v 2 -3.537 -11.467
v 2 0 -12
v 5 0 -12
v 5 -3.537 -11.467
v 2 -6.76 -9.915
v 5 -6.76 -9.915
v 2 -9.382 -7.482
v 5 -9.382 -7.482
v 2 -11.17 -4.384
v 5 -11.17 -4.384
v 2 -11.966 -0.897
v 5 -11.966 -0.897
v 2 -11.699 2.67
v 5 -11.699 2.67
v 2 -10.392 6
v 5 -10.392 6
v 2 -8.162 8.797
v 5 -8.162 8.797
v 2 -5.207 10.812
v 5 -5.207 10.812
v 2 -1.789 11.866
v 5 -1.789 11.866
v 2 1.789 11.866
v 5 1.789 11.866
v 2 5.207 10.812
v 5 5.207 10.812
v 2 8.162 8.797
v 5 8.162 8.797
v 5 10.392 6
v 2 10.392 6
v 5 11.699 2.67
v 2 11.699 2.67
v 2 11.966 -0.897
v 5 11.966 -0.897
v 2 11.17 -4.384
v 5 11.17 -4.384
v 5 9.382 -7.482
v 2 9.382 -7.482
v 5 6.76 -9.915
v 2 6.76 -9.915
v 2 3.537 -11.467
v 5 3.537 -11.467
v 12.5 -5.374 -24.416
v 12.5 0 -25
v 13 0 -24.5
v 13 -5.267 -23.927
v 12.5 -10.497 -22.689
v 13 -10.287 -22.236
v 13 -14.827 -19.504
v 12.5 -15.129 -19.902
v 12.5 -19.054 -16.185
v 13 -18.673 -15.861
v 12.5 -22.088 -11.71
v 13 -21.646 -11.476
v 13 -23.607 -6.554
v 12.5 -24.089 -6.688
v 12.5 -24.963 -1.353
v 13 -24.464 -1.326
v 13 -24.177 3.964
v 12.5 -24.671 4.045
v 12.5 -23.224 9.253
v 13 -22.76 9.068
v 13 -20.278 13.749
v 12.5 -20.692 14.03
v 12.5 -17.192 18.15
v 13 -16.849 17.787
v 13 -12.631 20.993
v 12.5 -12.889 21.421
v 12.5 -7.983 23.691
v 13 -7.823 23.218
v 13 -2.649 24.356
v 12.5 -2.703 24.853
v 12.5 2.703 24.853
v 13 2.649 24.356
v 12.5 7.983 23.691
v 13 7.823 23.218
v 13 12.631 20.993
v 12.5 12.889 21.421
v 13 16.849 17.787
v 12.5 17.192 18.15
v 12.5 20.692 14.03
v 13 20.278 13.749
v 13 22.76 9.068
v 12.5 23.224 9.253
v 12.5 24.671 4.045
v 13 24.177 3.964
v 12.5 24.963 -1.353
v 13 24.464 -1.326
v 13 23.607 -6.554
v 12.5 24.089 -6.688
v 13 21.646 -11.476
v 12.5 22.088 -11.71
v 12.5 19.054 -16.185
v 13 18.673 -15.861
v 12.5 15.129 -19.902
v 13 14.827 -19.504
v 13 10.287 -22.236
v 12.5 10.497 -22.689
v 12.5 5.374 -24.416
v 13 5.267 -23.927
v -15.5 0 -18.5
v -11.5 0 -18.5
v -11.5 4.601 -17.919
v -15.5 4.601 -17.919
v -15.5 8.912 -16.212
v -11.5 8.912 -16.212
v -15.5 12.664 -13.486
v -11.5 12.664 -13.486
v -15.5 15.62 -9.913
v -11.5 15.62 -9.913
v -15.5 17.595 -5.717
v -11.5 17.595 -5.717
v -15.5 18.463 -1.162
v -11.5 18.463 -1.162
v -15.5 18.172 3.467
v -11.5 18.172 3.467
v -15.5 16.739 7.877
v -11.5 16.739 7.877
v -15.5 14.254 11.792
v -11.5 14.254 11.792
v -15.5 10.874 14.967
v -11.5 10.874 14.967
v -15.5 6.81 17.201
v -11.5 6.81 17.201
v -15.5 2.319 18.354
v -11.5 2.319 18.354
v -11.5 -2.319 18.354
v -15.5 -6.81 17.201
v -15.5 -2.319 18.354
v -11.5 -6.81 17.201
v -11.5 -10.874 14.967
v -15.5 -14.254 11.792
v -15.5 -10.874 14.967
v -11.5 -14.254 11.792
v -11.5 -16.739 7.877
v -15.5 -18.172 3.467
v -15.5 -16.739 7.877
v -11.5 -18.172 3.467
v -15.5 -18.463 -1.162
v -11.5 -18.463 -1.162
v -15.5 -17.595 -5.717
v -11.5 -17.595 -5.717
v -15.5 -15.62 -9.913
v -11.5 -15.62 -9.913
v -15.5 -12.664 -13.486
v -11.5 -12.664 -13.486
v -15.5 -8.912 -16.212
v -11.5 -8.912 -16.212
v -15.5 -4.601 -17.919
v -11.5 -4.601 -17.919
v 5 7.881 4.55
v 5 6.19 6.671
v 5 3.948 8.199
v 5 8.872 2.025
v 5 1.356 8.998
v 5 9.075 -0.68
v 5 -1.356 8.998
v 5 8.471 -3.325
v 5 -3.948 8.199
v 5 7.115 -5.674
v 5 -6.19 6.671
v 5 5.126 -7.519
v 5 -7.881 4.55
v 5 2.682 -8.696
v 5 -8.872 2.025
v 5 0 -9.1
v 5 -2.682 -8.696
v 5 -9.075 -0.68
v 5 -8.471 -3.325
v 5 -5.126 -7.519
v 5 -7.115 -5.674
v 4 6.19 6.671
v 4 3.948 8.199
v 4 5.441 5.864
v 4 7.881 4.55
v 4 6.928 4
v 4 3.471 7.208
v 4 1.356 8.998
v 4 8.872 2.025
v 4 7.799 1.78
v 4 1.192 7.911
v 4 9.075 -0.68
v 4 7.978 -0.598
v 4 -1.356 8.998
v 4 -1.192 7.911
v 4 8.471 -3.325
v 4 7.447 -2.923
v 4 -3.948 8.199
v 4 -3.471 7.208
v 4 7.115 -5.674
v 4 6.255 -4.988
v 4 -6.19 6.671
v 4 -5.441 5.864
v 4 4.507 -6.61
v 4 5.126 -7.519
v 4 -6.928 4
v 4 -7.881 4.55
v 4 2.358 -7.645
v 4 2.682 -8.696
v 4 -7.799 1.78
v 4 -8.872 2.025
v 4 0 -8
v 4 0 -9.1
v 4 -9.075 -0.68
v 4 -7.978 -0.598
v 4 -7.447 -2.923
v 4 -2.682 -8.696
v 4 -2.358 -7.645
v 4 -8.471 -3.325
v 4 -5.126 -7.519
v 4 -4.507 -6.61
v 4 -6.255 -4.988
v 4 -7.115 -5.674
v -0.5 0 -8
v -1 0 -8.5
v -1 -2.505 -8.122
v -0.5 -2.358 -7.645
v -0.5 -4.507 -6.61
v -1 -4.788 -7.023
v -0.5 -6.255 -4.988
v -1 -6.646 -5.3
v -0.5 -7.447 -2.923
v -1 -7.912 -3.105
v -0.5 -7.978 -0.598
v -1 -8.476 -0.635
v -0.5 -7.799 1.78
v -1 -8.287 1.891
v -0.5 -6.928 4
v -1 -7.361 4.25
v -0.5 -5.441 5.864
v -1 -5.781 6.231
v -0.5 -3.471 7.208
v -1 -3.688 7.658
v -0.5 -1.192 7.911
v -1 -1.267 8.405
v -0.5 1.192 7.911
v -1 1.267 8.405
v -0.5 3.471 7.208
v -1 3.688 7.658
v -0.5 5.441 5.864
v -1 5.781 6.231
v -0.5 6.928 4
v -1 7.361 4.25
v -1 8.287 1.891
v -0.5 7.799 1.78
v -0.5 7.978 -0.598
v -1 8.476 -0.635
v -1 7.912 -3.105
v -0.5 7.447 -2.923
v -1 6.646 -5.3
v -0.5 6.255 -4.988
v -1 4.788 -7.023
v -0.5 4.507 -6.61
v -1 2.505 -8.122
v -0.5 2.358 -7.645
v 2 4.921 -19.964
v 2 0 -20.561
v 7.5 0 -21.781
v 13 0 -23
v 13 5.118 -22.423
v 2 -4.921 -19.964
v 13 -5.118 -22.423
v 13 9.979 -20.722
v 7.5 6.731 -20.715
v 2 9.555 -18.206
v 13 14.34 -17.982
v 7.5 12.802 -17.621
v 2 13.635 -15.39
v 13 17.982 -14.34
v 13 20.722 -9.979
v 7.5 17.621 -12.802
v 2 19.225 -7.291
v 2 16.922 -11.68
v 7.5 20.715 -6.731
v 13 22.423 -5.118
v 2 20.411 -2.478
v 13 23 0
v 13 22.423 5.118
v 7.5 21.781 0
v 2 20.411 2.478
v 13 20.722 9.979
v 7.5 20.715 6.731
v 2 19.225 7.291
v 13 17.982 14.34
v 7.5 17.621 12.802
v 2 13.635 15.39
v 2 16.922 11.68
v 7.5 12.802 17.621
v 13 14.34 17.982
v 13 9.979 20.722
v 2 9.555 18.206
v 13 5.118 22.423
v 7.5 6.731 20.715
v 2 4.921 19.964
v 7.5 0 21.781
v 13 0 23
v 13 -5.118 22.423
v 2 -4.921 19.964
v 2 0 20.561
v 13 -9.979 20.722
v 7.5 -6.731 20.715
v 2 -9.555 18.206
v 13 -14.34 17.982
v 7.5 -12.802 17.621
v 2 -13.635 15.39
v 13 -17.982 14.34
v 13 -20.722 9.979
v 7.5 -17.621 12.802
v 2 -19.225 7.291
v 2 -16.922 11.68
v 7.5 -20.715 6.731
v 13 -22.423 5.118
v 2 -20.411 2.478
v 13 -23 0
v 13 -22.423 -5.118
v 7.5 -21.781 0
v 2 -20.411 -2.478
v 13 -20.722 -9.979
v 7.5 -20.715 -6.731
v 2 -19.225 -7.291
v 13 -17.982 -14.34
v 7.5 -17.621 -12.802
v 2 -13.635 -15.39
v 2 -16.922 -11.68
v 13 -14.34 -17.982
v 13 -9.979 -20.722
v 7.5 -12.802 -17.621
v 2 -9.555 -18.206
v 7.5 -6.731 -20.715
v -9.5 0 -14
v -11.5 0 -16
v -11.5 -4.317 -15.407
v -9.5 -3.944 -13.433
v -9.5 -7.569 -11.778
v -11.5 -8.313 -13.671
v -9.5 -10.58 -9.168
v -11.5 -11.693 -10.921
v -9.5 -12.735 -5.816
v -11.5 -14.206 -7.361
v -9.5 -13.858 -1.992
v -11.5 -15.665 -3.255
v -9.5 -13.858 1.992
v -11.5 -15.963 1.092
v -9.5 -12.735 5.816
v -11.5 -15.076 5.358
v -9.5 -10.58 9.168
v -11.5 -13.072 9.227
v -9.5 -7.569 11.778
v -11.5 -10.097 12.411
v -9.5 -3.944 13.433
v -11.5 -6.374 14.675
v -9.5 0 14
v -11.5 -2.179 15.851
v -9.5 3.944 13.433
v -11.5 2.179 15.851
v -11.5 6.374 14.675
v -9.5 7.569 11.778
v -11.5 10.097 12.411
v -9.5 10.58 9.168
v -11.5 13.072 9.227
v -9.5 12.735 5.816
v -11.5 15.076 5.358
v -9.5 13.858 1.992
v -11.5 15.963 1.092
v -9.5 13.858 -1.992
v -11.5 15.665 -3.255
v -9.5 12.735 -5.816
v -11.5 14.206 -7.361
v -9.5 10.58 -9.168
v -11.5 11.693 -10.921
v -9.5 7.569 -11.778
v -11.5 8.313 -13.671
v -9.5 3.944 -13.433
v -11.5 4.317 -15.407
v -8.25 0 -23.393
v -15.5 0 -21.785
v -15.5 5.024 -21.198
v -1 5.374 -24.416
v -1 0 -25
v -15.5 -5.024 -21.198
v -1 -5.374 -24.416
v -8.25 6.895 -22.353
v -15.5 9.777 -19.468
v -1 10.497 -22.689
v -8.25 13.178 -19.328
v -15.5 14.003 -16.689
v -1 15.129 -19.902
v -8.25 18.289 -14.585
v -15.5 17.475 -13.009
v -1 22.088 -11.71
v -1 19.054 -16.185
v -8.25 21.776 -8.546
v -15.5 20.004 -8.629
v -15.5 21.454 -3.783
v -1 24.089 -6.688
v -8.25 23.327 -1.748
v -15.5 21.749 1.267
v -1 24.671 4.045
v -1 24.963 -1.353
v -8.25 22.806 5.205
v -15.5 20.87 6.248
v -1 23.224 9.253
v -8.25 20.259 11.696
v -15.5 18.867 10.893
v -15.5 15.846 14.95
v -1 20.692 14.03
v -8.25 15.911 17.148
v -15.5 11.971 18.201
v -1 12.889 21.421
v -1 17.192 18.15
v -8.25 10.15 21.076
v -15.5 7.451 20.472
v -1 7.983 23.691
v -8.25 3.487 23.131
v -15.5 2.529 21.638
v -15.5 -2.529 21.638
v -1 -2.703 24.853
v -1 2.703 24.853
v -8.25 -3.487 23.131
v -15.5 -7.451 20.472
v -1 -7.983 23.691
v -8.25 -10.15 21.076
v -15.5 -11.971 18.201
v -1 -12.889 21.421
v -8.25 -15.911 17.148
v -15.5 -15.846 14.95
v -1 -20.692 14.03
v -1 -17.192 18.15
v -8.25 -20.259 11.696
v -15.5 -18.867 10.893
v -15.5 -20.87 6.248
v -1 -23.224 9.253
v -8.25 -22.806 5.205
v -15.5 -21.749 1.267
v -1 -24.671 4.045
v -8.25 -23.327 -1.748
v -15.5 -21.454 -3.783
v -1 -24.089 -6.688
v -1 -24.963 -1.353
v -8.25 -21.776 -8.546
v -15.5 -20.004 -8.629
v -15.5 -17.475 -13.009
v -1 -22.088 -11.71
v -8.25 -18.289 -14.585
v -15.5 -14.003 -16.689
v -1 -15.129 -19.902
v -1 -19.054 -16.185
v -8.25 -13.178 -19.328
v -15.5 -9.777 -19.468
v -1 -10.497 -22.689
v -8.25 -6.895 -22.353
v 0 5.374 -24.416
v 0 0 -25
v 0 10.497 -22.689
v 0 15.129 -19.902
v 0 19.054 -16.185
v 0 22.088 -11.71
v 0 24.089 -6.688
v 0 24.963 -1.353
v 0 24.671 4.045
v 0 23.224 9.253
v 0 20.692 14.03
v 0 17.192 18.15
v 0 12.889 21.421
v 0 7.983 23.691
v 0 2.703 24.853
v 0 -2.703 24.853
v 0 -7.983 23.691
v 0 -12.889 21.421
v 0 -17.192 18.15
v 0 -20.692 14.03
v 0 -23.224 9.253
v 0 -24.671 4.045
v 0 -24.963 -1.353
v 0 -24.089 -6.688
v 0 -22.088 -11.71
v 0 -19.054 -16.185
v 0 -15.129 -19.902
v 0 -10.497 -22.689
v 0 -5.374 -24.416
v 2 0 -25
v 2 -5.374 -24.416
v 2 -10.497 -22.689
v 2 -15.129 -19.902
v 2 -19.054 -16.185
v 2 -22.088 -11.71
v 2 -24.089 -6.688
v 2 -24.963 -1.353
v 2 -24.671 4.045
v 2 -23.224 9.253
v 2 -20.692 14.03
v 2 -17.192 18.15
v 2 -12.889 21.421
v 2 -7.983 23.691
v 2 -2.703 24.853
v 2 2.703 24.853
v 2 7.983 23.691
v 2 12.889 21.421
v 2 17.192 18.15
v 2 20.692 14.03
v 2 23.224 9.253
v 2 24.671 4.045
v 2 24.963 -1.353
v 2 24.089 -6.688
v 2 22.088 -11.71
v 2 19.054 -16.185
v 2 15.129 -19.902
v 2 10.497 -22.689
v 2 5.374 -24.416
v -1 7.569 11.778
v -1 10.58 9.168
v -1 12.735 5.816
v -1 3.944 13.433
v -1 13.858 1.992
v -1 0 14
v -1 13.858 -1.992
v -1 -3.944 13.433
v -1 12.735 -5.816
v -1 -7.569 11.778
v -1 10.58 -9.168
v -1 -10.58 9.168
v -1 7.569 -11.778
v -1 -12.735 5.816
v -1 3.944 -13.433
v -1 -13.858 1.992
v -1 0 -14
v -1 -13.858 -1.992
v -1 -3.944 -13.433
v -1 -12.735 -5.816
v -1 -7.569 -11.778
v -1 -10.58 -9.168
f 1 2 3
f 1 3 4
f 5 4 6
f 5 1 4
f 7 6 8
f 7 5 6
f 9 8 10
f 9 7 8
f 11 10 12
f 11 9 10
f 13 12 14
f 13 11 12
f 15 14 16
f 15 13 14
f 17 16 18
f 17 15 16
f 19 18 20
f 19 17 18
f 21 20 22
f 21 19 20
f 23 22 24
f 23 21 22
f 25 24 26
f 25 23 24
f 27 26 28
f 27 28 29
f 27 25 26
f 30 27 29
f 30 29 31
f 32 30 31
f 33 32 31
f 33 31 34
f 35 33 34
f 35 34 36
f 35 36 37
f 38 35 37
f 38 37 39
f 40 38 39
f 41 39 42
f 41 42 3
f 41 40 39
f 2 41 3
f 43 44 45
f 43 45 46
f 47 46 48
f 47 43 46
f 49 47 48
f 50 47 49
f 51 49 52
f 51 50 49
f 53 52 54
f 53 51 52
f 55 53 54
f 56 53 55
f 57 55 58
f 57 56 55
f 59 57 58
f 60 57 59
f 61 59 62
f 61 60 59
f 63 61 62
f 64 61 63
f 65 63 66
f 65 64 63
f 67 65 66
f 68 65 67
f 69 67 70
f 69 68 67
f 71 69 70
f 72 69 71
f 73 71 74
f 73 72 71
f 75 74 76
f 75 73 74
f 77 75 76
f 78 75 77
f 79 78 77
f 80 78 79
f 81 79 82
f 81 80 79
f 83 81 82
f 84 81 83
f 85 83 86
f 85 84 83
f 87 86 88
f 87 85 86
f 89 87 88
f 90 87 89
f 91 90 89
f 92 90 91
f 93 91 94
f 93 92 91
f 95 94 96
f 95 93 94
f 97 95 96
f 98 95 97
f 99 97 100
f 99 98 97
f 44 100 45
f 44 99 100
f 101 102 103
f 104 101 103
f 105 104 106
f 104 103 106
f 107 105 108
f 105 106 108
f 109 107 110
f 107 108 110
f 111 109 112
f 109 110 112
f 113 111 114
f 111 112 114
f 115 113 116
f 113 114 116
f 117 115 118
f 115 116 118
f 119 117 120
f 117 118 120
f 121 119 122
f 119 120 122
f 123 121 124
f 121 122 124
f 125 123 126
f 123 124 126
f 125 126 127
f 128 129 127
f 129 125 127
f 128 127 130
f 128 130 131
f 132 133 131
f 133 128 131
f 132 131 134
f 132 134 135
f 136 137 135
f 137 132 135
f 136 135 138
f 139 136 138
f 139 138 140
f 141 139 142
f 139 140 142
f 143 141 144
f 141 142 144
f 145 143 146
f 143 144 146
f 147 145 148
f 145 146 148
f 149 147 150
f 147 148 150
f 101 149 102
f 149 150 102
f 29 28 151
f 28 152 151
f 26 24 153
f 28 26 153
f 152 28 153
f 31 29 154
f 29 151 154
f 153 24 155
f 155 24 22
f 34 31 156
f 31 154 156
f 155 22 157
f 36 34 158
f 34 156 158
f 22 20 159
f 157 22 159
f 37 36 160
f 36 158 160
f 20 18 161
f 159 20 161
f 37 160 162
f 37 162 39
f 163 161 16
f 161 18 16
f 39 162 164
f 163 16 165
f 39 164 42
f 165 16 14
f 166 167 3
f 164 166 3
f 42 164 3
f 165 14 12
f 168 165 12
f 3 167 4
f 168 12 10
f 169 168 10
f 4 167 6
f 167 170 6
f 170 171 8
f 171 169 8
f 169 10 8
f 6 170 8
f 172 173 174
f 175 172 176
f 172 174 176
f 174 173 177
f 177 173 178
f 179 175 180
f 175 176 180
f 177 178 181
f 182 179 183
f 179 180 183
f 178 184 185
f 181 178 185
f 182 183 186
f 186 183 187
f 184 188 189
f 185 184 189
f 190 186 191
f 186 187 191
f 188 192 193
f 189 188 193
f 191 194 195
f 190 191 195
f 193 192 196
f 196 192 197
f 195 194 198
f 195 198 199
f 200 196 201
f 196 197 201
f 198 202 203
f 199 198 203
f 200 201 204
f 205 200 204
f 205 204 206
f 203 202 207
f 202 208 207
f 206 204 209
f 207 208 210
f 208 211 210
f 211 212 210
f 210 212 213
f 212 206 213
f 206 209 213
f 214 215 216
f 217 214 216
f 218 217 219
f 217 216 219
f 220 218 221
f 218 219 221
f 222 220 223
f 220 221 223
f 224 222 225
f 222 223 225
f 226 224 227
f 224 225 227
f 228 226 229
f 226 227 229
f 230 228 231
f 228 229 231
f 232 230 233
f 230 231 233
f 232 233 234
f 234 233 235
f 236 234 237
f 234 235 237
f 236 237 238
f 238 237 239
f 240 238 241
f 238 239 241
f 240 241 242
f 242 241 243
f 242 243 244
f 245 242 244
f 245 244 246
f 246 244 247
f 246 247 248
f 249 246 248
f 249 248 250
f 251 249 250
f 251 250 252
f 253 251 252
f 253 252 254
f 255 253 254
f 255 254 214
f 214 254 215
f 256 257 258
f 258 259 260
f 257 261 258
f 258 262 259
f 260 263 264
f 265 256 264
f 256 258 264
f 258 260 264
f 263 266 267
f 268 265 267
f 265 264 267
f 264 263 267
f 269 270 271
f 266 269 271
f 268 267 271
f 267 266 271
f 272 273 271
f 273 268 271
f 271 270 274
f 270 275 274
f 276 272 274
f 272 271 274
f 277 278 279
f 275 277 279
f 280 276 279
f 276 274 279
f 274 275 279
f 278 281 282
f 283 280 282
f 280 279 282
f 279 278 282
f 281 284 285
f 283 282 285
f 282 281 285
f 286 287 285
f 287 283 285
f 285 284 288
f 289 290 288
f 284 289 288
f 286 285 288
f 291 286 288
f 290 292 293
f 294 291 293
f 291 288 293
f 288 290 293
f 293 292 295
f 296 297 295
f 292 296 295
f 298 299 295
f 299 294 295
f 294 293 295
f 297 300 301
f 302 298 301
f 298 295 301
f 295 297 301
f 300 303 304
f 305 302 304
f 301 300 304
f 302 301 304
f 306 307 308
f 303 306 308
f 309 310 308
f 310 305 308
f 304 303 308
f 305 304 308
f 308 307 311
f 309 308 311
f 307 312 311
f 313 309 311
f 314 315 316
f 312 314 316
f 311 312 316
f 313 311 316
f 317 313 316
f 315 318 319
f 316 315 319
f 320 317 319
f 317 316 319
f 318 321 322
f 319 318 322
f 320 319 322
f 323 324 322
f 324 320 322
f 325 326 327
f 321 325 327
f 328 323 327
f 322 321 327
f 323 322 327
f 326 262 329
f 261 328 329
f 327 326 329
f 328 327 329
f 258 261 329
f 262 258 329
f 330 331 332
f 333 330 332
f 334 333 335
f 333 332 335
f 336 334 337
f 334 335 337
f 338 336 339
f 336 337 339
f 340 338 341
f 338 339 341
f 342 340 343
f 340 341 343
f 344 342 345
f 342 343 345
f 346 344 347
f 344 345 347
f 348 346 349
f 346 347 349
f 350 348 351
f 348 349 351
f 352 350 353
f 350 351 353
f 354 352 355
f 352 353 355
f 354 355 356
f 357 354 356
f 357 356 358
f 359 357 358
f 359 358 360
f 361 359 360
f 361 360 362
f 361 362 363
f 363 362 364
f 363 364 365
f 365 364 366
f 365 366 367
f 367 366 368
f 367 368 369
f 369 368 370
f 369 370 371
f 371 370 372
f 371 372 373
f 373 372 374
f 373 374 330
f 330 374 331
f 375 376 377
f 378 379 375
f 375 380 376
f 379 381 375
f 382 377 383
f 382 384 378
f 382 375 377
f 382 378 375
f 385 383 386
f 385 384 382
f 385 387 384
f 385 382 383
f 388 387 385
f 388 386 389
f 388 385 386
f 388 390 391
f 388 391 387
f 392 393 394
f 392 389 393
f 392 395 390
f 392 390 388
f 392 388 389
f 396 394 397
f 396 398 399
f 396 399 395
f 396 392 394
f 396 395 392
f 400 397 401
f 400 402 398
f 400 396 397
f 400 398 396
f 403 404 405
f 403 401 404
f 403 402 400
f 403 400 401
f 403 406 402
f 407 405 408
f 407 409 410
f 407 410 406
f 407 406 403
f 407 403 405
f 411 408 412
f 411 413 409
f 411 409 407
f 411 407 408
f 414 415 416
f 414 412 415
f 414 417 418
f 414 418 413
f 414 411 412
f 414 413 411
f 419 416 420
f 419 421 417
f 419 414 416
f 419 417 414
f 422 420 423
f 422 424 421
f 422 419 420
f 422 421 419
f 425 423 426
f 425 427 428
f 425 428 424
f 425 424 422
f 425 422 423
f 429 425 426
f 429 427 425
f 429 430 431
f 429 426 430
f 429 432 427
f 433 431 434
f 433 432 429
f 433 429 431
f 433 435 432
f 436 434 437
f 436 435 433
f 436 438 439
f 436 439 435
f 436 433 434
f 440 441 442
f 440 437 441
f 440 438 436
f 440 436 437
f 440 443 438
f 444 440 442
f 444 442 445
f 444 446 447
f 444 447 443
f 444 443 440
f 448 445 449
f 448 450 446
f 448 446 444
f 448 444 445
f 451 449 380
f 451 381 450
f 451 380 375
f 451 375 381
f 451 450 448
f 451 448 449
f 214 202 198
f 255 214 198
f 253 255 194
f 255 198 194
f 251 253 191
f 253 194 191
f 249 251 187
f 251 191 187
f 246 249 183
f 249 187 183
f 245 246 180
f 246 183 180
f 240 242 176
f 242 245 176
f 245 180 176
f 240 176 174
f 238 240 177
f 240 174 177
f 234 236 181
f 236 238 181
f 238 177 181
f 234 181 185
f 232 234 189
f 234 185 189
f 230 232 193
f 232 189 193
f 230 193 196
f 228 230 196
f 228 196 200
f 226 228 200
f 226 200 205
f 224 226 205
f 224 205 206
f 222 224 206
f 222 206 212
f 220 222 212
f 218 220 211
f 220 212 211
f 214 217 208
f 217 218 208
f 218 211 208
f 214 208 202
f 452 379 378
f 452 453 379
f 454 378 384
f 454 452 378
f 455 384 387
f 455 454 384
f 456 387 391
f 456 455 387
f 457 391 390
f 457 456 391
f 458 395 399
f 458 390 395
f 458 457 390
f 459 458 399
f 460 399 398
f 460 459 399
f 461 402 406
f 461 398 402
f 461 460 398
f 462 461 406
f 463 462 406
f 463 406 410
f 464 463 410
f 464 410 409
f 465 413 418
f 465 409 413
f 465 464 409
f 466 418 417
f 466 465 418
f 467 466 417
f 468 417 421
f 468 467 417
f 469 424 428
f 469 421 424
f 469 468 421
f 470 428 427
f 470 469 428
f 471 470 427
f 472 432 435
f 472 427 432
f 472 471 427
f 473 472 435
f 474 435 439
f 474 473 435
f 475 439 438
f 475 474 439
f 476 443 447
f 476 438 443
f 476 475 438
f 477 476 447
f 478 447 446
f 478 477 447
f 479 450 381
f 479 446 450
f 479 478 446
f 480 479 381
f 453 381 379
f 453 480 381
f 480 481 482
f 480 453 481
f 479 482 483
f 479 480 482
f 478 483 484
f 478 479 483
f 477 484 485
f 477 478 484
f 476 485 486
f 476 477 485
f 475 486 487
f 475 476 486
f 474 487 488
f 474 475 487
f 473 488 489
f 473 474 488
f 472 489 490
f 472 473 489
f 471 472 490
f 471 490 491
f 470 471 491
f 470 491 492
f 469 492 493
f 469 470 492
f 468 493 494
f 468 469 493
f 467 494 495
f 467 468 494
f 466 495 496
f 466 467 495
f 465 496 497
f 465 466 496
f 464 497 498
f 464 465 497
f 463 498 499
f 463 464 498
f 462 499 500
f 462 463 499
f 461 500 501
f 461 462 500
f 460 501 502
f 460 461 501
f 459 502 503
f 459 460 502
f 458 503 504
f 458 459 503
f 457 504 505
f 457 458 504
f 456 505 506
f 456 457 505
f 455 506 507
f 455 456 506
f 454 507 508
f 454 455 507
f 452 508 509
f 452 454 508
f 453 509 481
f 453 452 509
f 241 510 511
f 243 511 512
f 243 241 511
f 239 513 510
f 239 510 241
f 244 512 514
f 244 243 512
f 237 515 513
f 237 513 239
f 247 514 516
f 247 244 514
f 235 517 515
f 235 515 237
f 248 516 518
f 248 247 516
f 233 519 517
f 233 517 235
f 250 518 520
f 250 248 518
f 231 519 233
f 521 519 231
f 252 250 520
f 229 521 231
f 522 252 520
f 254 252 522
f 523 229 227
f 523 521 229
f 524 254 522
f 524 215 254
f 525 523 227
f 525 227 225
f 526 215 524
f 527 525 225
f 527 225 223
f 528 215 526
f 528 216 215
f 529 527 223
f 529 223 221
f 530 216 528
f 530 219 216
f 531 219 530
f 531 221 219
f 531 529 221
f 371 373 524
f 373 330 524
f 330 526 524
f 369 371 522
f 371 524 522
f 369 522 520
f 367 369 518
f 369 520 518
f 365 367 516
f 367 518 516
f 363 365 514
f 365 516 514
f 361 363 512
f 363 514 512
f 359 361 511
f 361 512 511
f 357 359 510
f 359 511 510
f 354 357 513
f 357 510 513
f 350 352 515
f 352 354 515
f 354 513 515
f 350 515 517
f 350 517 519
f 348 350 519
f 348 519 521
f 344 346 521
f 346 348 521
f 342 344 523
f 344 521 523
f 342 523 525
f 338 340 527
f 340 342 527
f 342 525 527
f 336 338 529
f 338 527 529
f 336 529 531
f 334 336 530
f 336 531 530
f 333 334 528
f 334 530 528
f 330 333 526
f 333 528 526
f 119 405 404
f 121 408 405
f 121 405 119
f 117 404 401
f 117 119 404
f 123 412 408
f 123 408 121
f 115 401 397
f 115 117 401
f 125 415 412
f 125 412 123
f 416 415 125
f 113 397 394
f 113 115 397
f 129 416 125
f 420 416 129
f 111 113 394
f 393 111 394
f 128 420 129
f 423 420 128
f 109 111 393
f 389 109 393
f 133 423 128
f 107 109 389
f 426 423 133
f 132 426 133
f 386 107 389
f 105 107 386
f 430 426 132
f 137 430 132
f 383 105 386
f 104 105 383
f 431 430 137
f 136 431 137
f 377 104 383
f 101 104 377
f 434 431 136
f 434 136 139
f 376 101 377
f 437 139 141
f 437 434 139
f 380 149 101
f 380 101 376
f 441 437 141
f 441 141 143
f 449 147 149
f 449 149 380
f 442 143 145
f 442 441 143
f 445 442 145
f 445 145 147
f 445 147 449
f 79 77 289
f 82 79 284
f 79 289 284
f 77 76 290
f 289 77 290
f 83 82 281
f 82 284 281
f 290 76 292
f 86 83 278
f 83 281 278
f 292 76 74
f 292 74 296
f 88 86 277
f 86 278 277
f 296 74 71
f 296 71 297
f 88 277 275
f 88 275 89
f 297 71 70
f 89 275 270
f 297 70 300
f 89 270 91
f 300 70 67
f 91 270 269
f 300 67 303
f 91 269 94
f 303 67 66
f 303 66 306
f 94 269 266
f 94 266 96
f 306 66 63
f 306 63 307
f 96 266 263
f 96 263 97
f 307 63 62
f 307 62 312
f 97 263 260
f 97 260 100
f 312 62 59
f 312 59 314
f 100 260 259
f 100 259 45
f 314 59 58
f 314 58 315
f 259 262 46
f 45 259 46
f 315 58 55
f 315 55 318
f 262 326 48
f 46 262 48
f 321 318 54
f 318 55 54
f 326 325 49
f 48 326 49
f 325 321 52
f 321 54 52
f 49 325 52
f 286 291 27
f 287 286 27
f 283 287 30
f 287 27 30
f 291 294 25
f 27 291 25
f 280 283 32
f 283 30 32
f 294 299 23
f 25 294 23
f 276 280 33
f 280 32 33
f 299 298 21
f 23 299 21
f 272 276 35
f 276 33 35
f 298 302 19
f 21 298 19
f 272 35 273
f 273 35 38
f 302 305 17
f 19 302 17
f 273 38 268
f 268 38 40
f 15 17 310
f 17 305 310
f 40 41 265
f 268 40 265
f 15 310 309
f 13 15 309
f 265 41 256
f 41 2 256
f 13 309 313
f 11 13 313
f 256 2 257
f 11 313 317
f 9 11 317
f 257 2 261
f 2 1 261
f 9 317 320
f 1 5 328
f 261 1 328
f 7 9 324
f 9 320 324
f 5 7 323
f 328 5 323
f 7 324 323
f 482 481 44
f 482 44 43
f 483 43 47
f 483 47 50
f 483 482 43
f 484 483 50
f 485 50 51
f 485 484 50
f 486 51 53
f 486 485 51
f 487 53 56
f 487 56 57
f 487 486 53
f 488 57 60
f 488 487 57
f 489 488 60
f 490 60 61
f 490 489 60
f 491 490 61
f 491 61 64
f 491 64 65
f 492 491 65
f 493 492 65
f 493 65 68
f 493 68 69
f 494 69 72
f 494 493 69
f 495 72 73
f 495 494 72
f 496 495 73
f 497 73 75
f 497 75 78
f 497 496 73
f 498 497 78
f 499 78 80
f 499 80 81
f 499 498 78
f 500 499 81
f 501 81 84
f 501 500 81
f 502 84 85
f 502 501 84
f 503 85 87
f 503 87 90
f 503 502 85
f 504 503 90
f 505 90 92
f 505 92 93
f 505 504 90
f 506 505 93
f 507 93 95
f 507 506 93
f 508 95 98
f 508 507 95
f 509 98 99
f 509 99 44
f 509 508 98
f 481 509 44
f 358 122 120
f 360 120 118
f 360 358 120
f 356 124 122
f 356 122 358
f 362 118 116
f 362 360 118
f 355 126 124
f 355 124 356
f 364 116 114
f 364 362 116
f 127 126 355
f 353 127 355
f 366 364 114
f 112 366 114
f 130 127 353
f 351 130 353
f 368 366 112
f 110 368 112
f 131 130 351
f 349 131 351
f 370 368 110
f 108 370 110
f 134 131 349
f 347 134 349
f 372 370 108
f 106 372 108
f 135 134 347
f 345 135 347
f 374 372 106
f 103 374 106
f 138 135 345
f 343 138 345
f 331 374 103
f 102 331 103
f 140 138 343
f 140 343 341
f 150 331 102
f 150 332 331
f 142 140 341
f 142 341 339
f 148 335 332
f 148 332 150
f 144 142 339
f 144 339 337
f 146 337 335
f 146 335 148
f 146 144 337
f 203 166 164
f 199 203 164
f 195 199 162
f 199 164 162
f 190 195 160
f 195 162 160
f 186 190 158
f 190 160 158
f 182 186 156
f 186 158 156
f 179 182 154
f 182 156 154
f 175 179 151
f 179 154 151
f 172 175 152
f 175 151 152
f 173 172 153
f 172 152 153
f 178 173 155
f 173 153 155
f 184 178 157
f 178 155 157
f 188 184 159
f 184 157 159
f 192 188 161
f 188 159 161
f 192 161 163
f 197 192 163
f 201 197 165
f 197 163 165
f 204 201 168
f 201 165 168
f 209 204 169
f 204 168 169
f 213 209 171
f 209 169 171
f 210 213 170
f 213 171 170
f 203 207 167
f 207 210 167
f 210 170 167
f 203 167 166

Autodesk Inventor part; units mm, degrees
ref_plane "YZ Plane" through (0, 0, 0) normal (1, 0, 0) x (0, 1, 0)
ref_plane "XZ Plane" through (0, 0, 0) normal (0, 1, 0) x (-1, 0, 0)
ref_plane "XY Plane" through (0, 0, 0) normal (0, 0, 1) x (1, 0, 0)
sketch "Sketch1" plane through (0, 0, 0) normal (0, 1, 0) x (-1, 0, 0)
  line L0 (0, 0) -> (1, 0)
  line L1 (1, 0) -> (1, -8)
  line L2 (1, -8) -> (0, -8)
  line L3 (0, -8) -> (0, 0)
  line L4 (1, 0) -> (11.5, 0)
  line L5 (11.5, 0) -> (11.5, -14)
  line L6 (11.5, -14) -> (1, -14)
  line L7 (1, -14) -> (1, 0)
  line L8 (0, 0) -> (-13, 0)
  line L9 (-13, 0) -> (-13, -25)
  line L10 (-13, -25) -> (0, -25)
  line L11 (0, -25) -> (0, 0)
  line L12 (-13, -23) -> (0, -20.118)
  line L13 (-13, 0) -> (11.5, 0)
  line L14 (11.5, 0) -> (11.5, -25)
  line L15 (11.5, -25) -> (-13, -25)
  line L16 (-13, -25) -> (-13, 0)
  line L17 (-13, -25) -> (0, -22.118) construction
  line L18 (11.5, -25) -> (15.5, -25)
  line L19 (15.5, -25) -> (15.5, -18.5)
  line L20 (15.5, -18.5) -> (11.5, -18.5)
  line L21 (11.5, -18.5) -> (11.5, -25)
  line L22 (0, -8) -> (-5, -8)
  line L23 (-5, -8) -> (-5, -12)
  line L24 (-5, -12) -> (0, -12)
  line L25 (0, -12) -> (0, -8)
  line L26 (1, -8) -> (-2, -8)
  line L27 (-2, -8) -> (-2, -25)
  line L28 (-2, -25) -> (1, -25)
  line L29 (1, -25) -> (1, -8)
  line L30 (1, -25) -> (15.5, -21.7854)
  line L31 (-5, -8) -> (-4, -8)
  line L32 (-4, -8) -> (-4, -9.1)
  line L33 (-4, -9.1) -> (-5, -9.1)
  line L34 (-5, -9.1) -> (-5, -8)
  point P0 (1, -8)
  point P1 (0, -8)
  point P2 (0, -25)
  point P3 (11.5, -18.5)
  point P4 (0, -12)
  point P5 (0, -8)
  point P6 (0, -25)
  point P7 (-2, -12)
  point P8 (-2, -20.5614)
  point P9 (1, -25)
  dimension "d0" = 1
  dimension "d1" = 8
  dimension "d2" = 10.5
  dimension "d3" = 14
  dimension "d6" = 13
  dimension "d7" = 25
  dimension "d9" = 23
  dimension "d35" = 4
  dimension "d36" = 18.5
  dimension "d41" = 4
  dimension "d42" = 12.5
  dimension "d43" = 6
  dimension "d44" = 3
  dimension "d45" = 1
  dimension "d46" = 1.1
revolve "Revolution1" add sketch "Sketch1" angle 360 about axis through (0, 0, 0) along (-1, 0, 0) contours L2 L7 L29 L15 L11 | L11 L24 L27 L22 | L11 L12 L27 L24 | L27 L24 L23 L33 L32 L22 | L12 L27 L10 L9 | L6 L14 L30 L29 | L11 L10 L27 L12 | L20 L19 L30 L14
chamfer "Chamfer2" distance 0.5 angle 45 1 edges at (-1, 0, 8)
chamfer "Chamfer4" distance 0.5 angle 45 1 edges at (13, 0, 25)
chamfer "Chamfer5" distance 2 angle 45 1 edges at (-11.5, 0, 14)
properties part number "Flywheel" material "Brass, Soft Yellow"
